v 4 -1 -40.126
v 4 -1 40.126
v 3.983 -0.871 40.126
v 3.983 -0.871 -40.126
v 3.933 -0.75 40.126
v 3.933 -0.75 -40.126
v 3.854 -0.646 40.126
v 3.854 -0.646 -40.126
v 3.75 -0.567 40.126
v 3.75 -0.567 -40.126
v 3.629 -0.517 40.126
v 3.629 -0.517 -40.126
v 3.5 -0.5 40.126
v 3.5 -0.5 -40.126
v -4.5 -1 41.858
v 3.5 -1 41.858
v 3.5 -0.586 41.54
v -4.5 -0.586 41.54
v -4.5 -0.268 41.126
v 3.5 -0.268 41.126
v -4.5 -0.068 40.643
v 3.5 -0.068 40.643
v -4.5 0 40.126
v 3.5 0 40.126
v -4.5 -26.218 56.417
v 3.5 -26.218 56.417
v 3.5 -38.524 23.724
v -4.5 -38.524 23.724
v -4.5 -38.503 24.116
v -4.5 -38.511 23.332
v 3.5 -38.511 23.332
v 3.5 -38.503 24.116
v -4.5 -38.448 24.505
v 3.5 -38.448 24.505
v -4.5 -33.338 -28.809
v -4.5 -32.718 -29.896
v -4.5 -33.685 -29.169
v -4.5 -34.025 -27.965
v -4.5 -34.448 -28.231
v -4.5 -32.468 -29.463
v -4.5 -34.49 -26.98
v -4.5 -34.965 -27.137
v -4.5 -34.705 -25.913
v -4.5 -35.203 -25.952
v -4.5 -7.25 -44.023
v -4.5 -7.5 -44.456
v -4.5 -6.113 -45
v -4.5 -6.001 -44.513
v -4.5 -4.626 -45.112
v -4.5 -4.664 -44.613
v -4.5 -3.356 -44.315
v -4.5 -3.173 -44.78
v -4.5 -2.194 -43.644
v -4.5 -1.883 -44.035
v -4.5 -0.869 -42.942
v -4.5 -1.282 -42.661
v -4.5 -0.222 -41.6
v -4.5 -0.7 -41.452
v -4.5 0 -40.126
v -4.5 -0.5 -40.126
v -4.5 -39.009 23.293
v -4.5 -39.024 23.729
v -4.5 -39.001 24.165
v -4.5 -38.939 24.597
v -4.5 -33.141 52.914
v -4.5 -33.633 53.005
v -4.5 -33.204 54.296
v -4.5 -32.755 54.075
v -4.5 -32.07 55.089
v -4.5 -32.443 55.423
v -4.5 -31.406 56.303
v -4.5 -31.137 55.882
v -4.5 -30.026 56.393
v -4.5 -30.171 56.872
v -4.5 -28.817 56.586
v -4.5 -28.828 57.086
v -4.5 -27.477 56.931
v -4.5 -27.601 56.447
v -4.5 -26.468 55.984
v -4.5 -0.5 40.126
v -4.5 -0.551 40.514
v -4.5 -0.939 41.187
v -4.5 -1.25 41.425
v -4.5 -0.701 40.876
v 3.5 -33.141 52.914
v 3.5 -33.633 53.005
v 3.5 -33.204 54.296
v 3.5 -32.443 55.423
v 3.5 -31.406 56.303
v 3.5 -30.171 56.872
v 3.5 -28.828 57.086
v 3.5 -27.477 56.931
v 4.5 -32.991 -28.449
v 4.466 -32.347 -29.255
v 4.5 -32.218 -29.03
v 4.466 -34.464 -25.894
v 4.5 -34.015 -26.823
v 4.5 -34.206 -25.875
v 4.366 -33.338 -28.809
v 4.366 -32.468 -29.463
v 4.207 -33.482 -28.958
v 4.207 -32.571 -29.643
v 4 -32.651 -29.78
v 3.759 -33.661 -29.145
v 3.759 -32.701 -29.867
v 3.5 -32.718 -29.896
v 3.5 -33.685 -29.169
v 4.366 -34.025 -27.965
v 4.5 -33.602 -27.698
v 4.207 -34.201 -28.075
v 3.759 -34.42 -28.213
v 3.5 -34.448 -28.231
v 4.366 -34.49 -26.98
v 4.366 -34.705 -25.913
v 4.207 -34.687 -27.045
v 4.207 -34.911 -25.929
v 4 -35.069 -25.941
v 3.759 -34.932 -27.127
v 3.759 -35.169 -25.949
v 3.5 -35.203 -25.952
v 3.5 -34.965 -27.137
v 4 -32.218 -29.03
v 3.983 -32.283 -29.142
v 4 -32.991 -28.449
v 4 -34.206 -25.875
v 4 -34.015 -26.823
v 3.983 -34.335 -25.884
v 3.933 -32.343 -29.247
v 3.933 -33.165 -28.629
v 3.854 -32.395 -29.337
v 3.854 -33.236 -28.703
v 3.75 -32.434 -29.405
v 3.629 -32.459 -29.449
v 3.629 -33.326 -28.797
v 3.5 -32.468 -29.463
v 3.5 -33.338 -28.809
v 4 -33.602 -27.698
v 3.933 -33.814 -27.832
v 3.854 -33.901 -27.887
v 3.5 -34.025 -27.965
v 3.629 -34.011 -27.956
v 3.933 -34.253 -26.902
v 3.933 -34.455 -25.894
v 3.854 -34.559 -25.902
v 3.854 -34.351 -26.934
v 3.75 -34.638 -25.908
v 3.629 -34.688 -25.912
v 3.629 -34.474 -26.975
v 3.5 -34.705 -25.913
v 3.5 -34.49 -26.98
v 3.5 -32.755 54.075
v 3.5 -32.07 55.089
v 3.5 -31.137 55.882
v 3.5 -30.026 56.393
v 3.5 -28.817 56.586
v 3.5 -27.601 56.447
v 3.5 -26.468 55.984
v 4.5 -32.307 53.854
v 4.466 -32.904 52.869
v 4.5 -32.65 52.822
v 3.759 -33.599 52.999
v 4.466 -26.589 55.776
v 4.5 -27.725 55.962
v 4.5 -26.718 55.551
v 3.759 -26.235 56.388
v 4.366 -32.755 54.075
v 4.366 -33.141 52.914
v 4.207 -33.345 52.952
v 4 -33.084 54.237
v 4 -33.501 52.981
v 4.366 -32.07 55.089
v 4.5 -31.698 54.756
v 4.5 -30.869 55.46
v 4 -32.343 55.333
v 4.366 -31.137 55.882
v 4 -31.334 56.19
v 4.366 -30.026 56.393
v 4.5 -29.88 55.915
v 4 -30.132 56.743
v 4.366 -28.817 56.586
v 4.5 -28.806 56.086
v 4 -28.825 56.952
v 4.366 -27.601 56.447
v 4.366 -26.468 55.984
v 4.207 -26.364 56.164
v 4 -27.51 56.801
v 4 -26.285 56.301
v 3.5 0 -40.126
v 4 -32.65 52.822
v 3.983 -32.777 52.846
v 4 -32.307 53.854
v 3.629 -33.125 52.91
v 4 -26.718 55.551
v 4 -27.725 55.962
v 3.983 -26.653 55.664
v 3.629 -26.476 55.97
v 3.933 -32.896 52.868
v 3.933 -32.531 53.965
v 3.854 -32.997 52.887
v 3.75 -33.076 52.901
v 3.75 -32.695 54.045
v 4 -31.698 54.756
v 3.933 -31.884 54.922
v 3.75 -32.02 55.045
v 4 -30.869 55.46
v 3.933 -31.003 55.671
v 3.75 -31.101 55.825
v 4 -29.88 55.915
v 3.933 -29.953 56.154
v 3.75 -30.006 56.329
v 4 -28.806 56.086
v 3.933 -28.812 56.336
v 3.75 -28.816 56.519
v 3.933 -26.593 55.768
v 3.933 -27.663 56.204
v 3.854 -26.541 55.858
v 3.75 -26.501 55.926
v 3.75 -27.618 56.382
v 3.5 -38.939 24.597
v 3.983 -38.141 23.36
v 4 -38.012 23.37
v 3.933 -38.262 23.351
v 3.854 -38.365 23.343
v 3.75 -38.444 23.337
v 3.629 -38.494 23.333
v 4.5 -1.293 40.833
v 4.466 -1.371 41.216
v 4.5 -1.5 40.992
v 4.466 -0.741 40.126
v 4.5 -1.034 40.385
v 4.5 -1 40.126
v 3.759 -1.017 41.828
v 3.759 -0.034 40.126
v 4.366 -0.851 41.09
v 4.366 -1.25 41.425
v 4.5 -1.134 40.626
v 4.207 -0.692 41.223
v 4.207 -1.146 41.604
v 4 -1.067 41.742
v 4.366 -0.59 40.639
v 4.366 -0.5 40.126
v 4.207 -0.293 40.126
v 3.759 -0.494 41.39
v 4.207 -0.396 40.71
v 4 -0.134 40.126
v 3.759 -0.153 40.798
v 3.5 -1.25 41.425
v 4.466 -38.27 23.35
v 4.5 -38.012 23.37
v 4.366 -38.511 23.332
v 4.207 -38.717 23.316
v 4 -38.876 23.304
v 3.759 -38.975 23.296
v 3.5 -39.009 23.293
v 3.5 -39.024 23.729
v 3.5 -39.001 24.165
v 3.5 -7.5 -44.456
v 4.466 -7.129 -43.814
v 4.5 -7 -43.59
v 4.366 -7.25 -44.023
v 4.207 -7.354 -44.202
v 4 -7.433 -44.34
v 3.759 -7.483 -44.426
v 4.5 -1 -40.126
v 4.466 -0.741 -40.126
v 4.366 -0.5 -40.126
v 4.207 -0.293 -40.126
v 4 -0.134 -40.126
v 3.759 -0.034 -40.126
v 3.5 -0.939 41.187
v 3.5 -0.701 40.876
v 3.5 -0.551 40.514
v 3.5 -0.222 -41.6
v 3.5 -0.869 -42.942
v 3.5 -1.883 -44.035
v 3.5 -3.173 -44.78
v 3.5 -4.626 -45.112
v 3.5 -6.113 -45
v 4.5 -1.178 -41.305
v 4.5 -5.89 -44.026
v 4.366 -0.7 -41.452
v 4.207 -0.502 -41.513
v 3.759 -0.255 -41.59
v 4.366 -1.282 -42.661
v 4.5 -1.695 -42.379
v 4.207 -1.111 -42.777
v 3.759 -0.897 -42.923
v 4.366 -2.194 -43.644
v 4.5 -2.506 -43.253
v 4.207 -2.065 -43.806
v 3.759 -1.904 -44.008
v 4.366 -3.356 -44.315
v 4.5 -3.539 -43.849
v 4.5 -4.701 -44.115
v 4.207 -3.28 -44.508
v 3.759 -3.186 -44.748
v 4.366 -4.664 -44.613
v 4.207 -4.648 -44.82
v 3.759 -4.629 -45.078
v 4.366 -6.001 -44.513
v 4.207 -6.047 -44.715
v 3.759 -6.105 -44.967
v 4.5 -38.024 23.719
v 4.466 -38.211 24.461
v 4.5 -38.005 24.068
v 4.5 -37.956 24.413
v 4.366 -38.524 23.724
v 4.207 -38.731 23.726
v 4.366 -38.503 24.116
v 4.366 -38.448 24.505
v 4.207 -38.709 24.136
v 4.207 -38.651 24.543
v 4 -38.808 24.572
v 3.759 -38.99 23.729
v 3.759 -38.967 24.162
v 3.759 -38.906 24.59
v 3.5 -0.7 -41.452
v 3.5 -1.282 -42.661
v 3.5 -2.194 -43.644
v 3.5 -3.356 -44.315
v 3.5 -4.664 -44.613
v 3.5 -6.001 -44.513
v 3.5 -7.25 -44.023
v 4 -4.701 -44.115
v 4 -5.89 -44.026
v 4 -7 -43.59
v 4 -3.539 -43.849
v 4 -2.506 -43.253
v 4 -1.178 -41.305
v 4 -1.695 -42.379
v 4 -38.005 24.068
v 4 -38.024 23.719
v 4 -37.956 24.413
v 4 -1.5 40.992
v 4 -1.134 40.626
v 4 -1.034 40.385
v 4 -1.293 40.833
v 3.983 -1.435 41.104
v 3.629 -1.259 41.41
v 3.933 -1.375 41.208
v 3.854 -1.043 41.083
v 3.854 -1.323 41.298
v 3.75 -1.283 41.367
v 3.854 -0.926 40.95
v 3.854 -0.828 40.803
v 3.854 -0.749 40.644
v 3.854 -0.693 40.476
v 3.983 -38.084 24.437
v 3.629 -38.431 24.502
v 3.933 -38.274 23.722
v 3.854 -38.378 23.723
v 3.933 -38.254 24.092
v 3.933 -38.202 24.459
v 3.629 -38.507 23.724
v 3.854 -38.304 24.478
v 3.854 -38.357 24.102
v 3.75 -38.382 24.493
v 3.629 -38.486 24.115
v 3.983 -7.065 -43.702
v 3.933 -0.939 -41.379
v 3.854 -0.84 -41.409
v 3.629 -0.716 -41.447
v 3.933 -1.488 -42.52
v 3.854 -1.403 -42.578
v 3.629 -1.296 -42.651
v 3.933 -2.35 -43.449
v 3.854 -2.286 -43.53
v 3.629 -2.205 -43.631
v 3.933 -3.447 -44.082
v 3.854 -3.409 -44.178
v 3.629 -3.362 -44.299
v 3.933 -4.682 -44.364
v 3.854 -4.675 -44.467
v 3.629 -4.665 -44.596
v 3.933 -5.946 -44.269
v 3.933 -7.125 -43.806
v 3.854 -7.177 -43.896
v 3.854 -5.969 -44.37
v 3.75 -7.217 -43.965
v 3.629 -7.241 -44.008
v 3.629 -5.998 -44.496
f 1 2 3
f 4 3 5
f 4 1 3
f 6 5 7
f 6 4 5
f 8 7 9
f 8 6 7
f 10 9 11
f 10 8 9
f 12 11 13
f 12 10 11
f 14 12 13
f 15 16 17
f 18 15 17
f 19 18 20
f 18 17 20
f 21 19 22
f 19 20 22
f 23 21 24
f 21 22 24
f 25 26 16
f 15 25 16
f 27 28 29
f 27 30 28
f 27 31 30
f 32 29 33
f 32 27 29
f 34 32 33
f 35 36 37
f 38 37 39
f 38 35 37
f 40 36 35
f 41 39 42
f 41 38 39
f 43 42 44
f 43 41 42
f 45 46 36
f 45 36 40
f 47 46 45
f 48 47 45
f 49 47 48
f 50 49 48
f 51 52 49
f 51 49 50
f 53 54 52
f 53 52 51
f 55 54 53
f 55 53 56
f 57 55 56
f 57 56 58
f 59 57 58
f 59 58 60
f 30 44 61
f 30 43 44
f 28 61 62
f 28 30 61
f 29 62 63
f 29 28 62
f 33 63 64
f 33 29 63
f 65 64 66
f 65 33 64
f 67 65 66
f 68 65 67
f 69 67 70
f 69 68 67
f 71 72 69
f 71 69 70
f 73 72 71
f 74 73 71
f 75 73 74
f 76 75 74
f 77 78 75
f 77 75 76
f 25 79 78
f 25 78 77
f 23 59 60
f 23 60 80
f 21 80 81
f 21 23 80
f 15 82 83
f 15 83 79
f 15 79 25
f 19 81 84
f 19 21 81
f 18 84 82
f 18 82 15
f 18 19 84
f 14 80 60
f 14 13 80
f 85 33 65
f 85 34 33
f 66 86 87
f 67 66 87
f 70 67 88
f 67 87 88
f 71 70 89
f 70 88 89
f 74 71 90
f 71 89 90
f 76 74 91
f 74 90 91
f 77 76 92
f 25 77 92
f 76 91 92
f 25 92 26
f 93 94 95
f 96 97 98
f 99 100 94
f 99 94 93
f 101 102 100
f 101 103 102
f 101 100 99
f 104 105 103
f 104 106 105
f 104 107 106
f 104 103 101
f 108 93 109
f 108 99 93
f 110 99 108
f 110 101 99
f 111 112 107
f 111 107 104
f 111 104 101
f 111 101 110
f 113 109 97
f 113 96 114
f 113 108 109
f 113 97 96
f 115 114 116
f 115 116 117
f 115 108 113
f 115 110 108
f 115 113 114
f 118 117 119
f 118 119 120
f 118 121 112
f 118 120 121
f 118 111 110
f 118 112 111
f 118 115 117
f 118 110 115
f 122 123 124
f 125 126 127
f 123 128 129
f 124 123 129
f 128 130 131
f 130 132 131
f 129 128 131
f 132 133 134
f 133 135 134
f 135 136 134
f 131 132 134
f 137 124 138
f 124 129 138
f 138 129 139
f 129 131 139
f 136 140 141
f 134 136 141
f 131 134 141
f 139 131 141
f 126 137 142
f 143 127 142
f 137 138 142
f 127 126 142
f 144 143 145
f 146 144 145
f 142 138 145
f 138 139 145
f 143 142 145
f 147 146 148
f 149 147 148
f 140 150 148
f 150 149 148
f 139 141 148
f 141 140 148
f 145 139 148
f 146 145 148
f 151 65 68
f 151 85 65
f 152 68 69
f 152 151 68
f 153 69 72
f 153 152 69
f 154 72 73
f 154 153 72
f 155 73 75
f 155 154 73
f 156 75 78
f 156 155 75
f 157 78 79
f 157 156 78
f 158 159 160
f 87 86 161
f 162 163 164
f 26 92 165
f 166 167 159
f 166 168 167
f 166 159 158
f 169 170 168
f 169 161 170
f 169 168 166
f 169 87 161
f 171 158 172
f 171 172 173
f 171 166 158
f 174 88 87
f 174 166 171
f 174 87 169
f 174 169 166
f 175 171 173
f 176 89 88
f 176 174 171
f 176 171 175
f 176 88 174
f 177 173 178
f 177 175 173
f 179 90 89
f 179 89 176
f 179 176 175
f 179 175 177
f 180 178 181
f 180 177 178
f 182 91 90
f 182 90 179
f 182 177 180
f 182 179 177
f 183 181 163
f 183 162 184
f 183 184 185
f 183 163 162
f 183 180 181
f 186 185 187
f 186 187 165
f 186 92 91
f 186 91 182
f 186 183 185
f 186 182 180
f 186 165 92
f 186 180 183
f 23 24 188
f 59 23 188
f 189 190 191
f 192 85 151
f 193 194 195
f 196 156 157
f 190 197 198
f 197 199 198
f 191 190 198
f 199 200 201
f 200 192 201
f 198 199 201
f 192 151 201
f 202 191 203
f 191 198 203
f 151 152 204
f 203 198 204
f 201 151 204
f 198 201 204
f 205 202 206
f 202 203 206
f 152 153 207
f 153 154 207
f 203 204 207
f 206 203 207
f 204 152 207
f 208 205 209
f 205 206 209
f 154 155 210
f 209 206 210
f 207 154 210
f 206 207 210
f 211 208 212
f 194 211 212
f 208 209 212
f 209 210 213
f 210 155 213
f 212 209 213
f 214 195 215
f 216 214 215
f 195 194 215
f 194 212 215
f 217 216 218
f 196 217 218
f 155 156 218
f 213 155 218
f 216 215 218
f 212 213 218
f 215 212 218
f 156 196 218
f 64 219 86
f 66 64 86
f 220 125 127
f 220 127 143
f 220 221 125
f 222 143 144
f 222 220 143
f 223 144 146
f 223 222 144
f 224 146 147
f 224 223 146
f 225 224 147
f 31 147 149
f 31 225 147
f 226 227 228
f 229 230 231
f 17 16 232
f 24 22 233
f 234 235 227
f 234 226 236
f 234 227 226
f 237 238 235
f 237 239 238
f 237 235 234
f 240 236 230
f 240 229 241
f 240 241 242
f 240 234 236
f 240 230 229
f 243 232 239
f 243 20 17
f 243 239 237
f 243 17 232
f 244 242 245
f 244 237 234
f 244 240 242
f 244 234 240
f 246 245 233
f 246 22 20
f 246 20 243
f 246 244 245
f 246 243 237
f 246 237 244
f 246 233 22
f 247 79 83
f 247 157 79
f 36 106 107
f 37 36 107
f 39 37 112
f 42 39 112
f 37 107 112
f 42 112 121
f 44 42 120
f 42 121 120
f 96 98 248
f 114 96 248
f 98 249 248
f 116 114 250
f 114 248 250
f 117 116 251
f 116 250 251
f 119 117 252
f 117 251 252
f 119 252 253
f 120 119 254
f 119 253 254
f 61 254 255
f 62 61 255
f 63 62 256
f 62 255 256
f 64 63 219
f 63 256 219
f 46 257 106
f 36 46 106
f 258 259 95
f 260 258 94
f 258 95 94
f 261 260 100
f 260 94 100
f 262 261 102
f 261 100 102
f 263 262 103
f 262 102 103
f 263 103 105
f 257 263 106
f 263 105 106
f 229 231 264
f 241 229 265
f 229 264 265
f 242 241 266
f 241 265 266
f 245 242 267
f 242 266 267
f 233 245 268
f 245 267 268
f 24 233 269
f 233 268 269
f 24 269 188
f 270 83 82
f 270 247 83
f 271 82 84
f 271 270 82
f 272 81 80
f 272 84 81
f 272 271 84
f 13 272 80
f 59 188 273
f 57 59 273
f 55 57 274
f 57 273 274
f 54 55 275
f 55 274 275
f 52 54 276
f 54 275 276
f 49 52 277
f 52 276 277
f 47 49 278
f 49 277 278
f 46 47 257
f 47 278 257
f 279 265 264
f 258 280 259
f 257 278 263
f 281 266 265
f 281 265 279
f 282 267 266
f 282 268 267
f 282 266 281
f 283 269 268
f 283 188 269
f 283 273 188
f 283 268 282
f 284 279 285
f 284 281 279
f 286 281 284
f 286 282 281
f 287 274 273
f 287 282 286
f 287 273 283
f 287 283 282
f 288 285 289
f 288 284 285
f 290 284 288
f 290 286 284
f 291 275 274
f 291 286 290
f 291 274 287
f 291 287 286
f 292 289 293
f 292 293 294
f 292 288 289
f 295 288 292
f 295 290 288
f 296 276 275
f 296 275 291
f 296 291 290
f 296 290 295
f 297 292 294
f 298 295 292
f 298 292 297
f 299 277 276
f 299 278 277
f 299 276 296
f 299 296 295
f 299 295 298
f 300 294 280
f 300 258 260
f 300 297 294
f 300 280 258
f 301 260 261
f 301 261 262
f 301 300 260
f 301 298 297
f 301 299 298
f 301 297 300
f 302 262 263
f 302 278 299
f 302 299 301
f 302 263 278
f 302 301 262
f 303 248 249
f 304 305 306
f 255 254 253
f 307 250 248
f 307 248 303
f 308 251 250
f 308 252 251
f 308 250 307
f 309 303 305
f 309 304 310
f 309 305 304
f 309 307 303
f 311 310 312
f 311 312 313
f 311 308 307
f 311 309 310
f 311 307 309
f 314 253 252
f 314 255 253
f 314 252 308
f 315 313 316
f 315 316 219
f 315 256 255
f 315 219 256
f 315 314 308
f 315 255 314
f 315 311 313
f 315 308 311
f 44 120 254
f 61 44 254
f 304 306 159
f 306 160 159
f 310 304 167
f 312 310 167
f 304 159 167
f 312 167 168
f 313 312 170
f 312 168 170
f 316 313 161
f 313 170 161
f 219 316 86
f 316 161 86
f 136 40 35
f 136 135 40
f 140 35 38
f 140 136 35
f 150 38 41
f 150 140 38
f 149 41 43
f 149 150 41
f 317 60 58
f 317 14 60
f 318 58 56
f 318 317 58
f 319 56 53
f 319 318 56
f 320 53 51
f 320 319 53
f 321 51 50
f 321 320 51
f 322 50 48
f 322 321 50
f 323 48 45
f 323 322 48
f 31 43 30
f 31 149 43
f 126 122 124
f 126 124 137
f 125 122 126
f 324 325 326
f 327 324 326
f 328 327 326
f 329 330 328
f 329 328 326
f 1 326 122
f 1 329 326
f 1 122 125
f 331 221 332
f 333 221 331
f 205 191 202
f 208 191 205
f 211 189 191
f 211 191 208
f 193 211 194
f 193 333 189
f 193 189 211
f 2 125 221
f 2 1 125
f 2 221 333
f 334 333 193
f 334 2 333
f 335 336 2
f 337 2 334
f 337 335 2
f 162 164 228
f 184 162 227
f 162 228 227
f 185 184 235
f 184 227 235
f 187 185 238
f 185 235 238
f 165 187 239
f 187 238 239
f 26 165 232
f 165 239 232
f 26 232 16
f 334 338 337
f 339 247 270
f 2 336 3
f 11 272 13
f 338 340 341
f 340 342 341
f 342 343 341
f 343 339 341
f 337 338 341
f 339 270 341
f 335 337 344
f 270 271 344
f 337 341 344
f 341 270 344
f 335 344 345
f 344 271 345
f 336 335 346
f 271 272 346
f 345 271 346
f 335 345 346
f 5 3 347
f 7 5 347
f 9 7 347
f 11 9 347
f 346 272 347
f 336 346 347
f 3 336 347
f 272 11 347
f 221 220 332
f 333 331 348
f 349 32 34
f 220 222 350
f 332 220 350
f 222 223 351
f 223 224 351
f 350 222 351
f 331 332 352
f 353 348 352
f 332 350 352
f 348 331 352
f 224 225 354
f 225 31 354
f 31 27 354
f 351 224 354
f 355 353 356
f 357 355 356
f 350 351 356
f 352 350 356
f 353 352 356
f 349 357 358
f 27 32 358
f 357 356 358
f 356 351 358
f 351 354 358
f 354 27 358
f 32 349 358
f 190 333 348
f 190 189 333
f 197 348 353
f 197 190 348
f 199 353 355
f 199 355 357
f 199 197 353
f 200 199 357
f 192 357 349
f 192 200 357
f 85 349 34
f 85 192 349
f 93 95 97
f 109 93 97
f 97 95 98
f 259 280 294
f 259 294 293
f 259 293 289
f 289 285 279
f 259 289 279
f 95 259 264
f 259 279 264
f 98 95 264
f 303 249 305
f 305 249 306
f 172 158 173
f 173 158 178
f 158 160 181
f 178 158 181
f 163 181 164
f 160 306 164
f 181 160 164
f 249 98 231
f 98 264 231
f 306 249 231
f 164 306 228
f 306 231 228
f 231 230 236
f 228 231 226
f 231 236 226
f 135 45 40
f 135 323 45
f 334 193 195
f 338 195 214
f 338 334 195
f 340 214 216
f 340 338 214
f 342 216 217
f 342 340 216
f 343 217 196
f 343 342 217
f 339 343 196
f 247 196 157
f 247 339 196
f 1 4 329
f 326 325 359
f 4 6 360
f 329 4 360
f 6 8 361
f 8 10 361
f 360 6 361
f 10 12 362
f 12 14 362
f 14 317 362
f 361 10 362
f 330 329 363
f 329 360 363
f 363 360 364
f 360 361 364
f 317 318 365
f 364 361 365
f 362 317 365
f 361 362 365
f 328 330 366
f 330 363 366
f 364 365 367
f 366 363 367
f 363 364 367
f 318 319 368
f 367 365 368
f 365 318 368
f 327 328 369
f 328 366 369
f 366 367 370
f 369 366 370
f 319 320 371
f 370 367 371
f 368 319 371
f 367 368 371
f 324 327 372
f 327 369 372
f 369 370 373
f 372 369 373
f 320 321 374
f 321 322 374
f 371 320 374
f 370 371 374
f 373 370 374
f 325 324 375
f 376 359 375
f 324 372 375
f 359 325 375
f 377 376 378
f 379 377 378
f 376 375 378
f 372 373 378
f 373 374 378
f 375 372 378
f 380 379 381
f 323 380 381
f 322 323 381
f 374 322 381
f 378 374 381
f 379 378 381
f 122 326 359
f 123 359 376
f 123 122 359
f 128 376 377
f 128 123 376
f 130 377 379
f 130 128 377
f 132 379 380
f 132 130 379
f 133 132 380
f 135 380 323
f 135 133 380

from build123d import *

# Parameters (mm, degrees)
BOSS_EXTRUDE1_DEPTH = 4.5
FILLET2_R           = 1
SHELL1_T            = -0.5


with BuildPart() as part:
    # Sketch1 → Boss-Extrude1 (new, symmetric)
    with BuildSketch(Plane(origin=(0, 0, 0), x_dir=(0, 0, -1), z_dir=(1, 0, 0))):
        with BuildLine():
            Line((-40.125843709, 0), (40.125843709, 0))
            ThreePointArc((40.125843709, 0), (44.455970728, -2.5), (44.455970728, -7.5))
            Line((44.455970728, -7.5), (29.896385384, -32.717941552))
            ThreePointArc((29.896385384, -32.717941552), (28.231372637, -34.448445768), (25.95158068, -35.203072113))
            Line((25.95158068, -35.203072113), (-23.293348854, -39.009425834))
            ThreePointArc((-23.293348854, -39.009425834), (-23.94733545, -39.017072006), (-24.596725125, -38.939290383))
            Line((-24.596725125, -38.939290383), (-53.005406797, -33.632936662))
            ThreePointArc((-53.005406797, -33.632936662), (-56.629531724, -30.808063795), (-56.41747986, -26.217941552))
            Line((-56.41747986, -26.217941552), (-41.857894516, -1))
            ThreePointArc((-41.857894516, -1), (-41.125843709, -0.267949192), (-40.125843709, 0))
        make_face()
    extrude(amount=BOSS_EXTRUDE1_DEPTH, both=True)

    # Fillet2
    fillet2_edges = [part.edges().sort_by_distance(p)[0] for p in [
        (4.5, -30.808063795, 56.629531724),
        (4.5, -36.286113523, 38.801065961),
        (4.5, -39.017072006, 23.94733545),
        (4.5, -37.106248974, -1.329115913),
        (4.5, -34.448445768, -28.231372637),
        (4.5, -20.108970776, -37.176178056),
        (4.5, -2.5, -44.455970728),
        (4.5, 0, 0),
        (4.5, -0.267949192, 41.125843709),
        (4.5, -13.608970776, 49.137687188),
    ]]
    fillet(fillet2_edges, radius=FILLET2_R)

    # Shell1
    shell1_openings = [part.faces().sort_by_distance(p)[0] for p in [
        (-4.5, -18.296225023, 6.473740626),
    ]]
    offset(amount=SHELL1_T, openings=shell1_openings, kind=Kind.INTERSECTION)


solid = part.part
